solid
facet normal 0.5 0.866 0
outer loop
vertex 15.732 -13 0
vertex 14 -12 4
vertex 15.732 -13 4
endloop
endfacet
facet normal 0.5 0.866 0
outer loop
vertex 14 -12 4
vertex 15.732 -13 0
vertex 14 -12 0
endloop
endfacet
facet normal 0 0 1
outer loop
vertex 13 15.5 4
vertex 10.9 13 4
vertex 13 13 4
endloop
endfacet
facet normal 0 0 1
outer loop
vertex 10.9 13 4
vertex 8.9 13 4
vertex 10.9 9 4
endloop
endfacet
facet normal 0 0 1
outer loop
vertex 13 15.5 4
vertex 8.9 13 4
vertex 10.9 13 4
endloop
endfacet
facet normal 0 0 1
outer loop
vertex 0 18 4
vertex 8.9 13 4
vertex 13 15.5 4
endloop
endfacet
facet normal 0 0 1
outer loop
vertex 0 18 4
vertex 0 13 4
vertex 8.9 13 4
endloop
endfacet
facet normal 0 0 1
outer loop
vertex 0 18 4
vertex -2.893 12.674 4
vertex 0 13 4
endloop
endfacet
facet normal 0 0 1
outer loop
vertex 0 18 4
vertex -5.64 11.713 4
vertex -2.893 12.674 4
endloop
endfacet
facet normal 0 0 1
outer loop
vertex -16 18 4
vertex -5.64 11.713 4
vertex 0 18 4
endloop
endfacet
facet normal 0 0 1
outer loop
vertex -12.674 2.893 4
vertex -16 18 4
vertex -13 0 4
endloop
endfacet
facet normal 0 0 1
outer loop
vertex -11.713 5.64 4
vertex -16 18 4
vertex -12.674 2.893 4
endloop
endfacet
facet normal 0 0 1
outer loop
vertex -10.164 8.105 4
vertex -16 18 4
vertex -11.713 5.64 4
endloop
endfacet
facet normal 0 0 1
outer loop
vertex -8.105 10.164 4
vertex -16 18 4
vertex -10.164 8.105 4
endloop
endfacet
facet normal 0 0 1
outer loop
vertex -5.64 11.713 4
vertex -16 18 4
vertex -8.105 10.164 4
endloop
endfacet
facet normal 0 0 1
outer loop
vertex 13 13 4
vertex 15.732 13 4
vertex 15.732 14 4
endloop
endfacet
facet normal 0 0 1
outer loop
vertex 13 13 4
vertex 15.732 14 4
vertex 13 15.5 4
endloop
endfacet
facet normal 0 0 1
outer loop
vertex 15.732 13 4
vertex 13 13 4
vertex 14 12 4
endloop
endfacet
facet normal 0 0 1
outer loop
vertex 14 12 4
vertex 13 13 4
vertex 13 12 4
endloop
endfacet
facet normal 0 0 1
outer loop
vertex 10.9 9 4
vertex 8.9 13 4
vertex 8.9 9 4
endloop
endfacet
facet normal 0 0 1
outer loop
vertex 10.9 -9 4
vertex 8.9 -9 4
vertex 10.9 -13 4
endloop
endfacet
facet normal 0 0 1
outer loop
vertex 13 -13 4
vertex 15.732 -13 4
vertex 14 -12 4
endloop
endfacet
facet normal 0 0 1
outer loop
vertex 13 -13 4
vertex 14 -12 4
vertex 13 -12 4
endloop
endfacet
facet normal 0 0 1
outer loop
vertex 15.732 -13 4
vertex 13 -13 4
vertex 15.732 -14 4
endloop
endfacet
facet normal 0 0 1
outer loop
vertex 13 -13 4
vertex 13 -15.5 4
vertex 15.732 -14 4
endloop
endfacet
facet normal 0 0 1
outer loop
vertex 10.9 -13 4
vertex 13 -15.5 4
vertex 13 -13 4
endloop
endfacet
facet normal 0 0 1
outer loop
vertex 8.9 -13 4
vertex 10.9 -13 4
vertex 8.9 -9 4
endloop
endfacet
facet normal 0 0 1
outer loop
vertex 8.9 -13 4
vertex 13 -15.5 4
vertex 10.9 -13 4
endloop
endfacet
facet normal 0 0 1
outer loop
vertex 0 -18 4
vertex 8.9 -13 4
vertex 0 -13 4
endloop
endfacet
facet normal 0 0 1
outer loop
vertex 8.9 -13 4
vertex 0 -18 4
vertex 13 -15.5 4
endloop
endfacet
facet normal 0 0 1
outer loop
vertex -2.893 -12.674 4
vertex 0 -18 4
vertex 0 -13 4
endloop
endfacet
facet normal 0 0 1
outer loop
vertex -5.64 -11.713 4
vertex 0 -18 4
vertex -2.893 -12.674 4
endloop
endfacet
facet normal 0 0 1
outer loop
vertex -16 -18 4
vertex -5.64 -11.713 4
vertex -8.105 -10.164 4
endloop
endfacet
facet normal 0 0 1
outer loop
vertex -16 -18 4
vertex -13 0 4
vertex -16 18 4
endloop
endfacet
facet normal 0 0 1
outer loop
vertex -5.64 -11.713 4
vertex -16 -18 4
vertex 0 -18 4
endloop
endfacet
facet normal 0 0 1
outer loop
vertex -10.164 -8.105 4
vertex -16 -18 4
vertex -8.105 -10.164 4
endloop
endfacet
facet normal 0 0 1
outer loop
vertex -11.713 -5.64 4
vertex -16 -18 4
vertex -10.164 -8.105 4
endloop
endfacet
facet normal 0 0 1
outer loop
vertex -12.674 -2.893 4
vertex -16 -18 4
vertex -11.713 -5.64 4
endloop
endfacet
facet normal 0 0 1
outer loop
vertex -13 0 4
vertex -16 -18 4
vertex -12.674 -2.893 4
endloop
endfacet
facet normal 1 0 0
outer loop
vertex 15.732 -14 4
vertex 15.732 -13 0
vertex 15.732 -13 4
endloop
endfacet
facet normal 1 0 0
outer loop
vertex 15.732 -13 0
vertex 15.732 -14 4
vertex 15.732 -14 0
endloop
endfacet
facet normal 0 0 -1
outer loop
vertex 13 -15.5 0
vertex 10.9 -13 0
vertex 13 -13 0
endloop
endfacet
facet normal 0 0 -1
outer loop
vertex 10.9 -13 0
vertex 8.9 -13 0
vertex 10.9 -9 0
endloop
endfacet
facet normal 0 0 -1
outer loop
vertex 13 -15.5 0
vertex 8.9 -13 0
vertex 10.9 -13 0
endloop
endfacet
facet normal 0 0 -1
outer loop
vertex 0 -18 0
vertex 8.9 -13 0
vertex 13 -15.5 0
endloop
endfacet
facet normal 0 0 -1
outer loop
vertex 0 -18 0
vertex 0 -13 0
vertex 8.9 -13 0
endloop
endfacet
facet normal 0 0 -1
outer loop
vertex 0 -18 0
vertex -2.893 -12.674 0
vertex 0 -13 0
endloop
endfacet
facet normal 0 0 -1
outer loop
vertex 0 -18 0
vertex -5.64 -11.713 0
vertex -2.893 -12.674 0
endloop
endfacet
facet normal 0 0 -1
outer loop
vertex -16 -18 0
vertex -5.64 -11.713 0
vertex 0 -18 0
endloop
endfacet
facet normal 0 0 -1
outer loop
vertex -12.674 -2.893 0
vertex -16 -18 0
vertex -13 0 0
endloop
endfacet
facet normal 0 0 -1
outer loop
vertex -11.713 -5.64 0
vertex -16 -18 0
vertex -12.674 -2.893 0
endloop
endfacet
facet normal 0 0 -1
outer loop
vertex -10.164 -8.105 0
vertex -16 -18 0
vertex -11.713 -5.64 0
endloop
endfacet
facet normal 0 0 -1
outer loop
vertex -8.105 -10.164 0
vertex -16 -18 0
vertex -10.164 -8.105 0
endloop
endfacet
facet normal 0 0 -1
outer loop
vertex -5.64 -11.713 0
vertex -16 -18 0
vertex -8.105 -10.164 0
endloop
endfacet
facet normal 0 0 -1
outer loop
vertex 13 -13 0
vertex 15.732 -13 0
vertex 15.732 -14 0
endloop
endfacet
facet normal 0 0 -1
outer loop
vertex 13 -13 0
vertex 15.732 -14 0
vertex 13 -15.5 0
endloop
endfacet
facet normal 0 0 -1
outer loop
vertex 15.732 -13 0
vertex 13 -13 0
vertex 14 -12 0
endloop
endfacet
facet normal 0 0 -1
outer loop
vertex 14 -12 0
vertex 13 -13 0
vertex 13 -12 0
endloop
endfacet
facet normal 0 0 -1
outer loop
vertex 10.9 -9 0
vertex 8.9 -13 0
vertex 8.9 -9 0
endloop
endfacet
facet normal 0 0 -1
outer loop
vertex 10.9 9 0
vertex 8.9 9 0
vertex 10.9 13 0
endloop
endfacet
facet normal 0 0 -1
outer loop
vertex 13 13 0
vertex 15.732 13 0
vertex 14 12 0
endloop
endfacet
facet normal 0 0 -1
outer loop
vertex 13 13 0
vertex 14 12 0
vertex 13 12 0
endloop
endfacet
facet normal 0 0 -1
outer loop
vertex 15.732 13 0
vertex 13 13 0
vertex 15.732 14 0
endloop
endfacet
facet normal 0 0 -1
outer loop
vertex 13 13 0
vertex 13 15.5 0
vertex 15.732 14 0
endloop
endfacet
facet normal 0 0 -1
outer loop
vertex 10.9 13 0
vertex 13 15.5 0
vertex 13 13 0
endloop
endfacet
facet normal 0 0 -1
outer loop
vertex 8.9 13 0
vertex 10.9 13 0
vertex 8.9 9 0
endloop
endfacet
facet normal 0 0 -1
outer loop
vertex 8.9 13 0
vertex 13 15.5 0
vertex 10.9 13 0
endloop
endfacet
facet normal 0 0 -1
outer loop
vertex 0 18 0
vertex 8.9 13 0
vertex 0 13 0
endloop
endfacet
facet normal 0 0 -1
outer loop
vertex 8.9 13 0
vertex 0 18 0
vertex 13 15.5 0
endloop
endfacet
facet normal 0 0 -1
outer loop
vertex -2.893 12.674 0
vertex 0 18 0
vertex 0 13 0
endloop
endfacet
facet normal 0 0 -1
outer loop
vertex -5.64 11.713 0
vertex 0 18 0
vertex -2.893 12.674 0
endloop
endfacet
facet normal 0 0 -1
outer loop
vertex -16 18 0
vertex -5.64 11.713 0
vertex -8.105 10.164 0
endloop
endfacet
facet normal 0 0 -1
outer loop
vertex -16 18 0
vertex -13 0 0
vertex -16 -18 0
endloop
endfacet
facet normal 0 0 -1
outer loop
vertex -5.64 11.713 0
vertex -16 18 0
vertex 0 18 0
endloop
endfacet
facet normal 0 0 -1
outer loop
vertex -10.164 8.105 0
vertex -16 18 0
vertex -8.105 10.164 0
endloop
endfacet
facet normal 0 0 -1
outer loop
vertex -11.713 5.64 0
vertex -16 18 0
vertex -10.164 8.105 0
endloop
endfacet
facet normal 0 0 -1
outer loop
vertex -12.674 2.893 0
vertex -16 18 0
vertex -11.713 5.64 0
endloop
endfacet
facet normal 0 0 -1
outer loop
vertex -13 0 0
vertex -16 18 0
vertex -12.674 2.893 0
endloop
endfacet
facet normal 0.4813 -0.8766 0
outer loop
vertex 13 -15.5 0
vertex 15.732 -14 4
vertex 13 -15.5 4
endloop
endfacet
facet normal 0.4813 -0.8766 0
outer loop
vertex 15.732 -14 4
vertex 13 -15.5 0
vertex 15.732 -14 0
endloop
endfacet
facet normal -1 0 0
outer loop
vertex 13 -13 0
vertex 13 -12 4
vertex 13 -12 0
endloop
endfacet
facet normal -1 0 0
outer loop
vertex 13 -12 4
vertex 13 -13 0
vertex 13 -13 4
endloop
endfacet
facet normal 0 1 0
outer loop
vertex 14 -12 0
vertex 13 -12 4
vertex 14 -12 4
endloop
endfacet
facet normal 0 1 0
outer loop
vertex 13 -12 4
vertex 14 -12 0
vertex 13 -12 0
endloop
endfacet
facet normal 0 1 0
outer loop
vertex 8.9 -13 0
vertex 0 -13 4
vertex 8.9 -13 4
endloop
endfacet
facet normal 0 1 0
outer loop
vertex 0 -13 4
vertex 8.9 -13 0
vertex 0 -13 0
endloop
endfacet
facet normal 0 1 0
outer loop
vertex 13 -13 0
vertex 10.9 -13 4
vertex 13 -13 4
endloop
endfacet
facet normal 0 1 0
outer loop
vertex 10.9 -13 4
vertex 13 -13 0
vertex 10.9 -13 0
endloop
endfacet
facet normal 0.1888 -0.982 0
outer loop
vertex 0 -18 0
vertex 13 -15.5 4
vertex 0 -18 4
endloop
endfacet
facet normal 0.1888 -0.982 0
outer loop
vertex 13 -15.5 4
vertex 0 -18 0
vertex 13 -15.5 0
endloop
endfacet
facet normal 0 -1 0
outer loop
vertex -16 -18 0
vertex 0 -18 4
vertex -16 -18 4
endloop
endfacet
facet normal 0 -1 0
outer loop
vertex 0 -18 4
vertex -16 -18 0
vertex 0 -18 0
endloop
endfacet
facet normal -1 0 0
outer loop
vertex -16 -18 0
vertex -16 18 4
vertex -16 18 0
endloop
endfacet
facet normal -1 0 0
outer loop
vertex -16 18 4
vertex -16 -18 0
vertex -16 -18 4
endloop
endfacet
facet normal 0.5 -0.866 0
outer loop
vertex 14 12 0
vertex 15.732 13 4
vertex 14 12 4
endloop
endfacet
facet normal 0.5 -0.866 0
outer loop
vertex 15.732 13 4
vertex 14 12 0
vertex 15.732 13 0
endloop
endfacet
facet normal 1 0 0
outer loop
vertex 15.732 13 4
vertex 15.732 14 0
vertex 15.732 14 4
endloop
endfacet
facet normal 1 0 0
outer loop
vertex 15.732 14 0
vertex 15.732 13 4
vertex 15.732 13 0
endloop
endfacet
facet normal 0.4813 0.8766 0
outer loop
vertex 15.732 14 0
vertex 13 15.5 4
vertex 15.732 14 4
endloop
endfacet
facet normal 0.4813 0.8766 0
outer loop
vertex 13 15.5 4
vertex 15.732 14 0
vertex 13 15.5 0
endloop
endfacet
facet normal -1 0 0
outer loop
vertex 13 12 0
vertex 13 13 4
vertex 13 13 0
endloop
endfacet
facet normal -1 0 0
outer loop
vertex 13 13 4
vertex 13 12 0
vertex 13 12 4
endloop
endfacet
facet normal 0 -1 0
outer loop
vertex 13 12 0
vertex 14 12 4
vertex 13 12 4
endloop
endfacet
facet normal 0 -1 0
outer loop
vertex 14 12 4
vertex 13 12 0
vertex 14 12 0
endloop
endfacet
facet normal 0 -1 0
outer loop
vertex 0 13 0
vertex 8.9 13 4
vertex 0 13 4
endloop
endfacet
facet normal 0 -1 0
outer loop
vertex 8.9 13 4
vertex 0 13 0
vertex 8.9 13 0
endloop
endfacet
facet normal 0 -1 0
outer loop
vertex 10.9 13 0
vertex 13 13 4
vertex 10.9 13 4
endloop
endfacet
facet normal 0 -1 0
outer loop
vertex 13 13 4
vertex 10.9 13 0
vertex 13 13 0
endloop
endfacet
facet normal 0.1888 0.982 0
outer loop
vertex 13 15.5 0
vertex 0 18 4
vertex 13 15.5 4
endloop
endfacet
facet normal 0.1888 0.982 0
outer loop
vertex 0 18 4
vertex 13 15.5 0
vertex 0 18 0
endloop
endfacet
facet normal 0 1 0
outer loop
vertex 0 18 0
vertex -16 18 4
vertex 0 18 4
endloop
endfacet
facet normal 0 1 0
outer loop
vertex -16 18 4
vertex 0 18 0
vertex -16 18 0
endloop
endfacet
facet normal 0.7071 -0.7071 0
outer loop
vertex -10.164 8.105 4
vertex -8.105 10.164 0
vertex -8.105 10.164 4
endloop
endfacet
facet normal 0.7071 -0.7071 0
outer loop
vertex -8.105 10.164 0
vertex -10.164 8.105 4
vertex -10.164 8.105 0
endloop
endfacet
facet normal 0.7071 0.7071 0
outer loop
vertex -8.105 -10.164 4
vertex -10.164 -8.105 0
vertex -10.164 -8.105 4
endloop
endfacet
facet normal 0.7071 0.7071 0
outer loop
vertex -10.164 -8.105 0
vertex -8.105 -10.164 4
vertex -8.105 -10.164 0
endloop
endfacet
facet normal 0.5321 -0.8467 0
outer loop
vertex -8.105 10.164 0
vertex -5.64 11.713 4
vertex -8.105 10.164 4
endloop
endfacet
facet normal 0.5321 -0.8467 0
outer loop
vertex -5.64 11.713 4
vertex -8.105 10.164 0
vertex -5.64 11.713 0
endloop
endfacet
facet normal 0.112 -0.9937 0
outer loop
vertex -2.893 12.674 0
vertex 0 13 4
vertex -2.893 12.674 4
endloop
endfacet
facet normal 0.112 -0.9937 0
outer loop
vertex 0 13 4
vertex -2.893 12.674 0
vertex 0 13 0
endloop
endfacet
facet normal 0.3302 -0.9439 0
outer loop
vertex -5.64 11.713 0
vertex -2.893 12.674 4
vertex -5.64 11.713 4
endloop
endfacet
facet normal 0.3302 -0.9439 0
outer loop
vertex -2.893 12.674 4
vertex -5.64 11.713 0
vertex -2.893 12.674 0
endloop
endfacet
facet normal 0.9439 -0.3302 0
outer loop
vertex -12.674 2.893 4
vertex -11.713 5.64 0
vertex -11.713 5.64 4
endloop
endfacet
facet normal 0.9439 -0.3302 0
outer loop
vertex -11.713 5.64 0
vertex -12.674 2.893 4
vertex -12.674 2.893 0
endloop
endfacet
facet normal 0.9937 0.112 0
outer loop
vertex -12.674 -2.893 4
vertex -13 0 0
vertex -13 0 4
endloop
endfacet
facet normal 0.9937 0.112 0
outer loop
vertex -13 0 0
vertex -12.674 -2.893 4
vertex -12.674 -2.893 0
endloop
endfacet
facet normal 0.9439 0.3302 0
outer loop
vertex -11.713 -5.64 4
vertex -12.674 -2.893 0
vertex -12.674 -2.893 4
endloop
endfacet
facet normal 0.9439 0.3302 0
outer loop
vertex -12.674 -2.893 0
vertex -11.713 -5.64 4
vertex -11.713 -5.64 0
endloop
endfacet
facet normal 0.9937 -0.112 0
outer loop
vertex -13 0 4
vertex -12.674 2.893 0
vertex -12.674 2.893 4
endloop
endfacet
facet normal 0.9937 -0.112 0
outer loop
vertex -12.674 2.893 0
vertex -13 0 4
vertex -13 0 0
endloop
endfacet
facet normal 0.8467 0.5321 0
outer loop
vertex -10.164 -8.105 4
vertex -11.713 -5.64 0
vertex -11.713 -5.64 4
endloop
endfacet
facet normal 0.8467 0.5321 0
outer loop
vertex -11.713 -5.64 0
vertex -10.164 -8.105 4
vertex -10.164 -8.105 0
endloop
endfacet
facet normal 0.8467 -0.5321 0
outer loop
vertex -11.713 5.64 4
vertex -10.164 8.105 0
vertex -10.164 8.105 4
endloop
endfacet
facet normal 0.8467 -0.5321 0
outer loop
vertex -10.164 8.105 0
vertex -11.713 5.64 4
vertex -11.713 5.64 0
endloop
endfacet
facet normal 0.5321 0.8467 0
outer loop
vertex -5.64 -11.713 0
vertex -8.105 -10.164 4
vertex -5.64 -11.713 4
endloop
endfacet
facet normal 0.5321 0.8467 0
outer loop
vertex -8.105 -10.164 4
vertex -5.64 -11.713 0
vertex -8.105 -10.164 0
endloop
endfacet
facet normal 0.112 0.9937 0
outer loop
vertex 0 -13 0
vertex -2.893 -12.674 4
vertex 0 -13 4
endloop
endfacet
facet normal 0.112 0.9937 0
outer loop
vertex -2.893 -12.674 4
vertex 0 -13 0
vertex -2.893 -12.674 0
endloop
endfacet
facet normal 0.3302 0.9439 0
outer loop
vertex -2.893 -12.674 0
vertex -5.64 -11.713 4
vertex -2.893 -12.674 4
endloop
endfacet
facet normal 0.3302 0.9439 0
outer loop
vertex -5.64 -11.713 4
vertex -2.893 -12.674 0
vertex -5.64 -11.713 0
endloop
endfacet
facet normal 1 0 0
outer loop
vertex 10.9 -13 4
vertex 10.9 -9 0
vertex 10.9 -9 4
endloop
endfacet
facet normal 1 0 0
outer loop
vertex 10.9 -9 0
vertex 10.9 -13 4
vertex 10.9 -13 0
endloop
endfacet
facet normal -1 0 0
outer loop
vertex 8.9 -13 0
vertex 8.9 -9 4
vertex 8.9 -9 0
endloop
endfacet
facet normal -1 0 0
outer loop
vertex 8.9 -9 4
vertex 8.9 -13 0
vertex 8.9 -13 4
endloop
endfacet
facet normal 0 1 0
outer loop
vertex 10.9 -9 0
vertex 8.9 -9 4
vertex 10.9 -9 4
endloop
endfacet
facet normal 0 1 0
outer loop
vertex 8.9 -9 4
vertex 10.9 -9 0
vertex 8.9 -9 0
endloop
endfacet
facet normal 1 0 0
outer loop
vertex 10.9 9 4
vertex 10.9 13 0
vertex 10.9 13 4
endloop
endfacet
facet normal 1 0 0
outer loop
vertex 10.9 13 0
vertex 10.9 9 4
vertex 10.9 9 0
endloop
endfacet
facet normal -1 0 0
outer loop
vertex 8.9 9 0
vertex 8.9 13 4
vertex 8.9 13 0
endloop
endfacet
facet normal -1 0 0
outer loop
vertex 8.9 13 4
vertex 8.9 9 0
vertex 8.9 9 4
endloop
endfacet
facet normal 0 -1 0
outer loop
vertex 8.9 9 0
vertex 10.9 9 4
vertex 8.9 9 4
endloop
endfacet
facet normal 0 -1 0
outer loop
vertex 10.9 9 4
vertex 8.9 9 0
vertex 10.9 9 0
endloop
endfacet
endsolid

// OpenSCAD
// file: mirror_copy.scad
module mirror_copy(vector=[1,0,0]){
    children();
    mirror(vector) children();
}
// file: snapLib/SnapLib.0.36.scad
/*simple Snap library based on "Snap-Fit Joints for Plastics - A Design Guid" by Bayer MaterialScience LLC 
  http://fab.cba.mit.edu/classes/S62.12/people/vernelle.noel/Plastic_Snap_fit_design.pdf
 
 on http://www.thingiverse.com/thing:1860118
 
    by fpetrac Fausto Petraccone fpetrac@gmail.com 
    Licensed under the Creative Commons - Attribution - Non-Commercial license.
*/

/*Rev
    SnapLib 0.36.scad: added SnapHoleY function  
    SnapLib 0.35.scad: on RSnapY added a check to avioid interference of lobes during closure; on RRSnappY added a check to avioid overlapped lobes.
    SnapLib 0.30.scad  added function Hsnap and Snap to calculate the snap H or Y for cantilever snap
    SnapLib 0.25.scad  added Scale factor f to reduce the calculate value h or y (this mantain the snap on unbreakable zone when f>1)
    Snaprofile = 12; // [1:MXL, 2:40DP, 3:XL, 4:H, 5:T2.5, 6:T5, 7:T10, 8:AT5, 9:HTD_3mm, 10:HTD_5mm, 11:HTD_8mm, 12:GT2_2mm, 13:GT2_3mm, 14:GT2_5mm]
pLib 0.20.scad  Bug Fix
    SnapLib 0.10.scad  added RSnapY RRSnapY
    SnapLib 0.00.scad  first release
*///Example: 
//SnapY(la=10,root=5,uCut=1,l=30,w=4,help=true);

la=10;  //arm length(x)
root=3; //arm thickness at root
uCut=1;l=30;
w=4;    //arm width
f=1;    //factor
help=false; //help message

h=root;


/*
eps=0.5*6/100;//Elongation at break of PLA=6%
eps=0.5*12/100;//Elongation at break of ABS=12%
eps=0.5*18/100;//Elongation at break of PETG=18%
*/


profile = 1; // [1:SnapY, 2:SnapH, 3:SnapHoleY, 4:RSanapY, 5:RRSnapY]
if ( profile == 1 ) {SnapY(la=10,root=3,uCut=1,l=30,w=4,f=1,help=false ); }
if ( profile == 2 ) {SnapH(l,root,uCut,w,f=1,help); }
if ( profile == 3 ) {SnapHoleY(l=10,h=3,uCut=1,a=30,b=3,f=1,Pr=2); }
if ( profile == 4 ) {RSnapY(l,h,a,Lobi,r2,f=1,K2=2); }
if ( profile == 5 ) {RRSnapY(l,h,a,Lobi,r2,f=1,K1=2); }

eps=0.5*6/100;//Elongation at break of PLA=6%

//******************* functions **************************
function arm(l=10,w=4)=[[0,0],[l,0],[l,-w/2],[0,-w]];
function hook(width=4,uCut=1,xLand=1,angle=30,yLand=1)=[[0,0],[0,uCut],[xLand,uCut],[xLand+uCut/tan(angle),0],[xLand+uCut/tan(angle),-yLand],[0,-width]];
function Hsnap(l,y,f)= (1.09/f)*(eps*pow(la,2))/(y);
function Ysnap(l,h,f)= (1.09/f)*(eps*pow(la,2))/(h);

//SnapH(l=length,y,a=angle,b=width,f=1) Define y calculate h and divide the calculte h value to a factor f

//********************************************************
module SnapH(la,uCut,root,w,f=1)   
{
    h=Hsnap(l,y,f); //(length,depth,factor)
    p=y;
    
linear_extrude(height = b, center = f, convexity = 10, twist = 0)
polygon([[0,0],[l,0],[l,y],[l+p,y],[l+p+(y+h/4)/tan(a),-h/4],[l,-h/2],[0,-h]]);
}

//SnapY(la,root,uCut,l,w,f,help) 
//Define root calculate y and divide the calculated y value by a factor f

//********************************************************
module SnapY(la=10,root=3,uCut=1,l=30,w=4,f=1,help=false){
    helpText="Usage:\nmodule SnapY(la,root,uCut,l,w,f,help=false)\n
    la=length of clip from root of arm to hook(x)\n
    root=width of arm at root,\n
    uCut=depth of undercut(hook protrusion)\n
    l=overall length of clip(x)\n
    w=width of arm(z)\n
    f=factor)";
    if(help)echo(helpText);
    y=min(Ysnap(la,root,f),uCut);
     translate([la,0,0])linear_extrude(w)polygon(hook(root/2,uCut,1,l,1));
    linear_extrude(w)polygon(arm(la,root));
}

//********************************************************
//SnapHoleY(l,h,a,b,f=1,Pr=2) Define h calculate y and divide the calculte y value to a factor f the total hole depth is h*PR
module SnapHoleY(l=10,h=3,uCut=1,a=30,b=3,f=1,Pr=2){
        //%SnapY(l,h,a,b);  
        y=min(Ysnap(l,h,f),uCut); 
        YY=Pr*h;//depth Y;
        XX=1.1*(y+(y+h/4)/tan(a)); //Altezza totale +10%
        ZZ=0+b; //largezza piu tolleranza
        union(){
            translate([0,-YY,(b-ZZ)/2])cube([l,YY,ZZ],center=false); //gambo
            translate([l,-YY,(b-ZZ)/2])cube([XX,YY+y,ZZ],center=false);//testa
        }    
 }


//Define h calculate y and divide the calculated value to f
 
//********************************************************
module RSnapY(l,h,a,Lobi,r2,f=1,K2=2)   
{
    Theta=180/Lobi;
    y=(1.64/f)*K2*(eps*pow(l,2))/(r2);
    p=y;
    if(((r2-h)>y)&&(h<r2)){ //(r2-h)>y should be (r2-h/2)>y and  h<r2 for scad problem
      for(f=[0:1:Lobi])
          rotate([0,0,Theta*2*f])
              rotate_extrude(angle = Theta, convexity = 2,$fn=200)
                  translate([r2,0,0])
                      mirror([1,-1,0])
                          polygon([[0,0],[l,0],[l,y],[l+p,y],[l+p+(y+h/4)/tan(a),-h/4],[l,-h/2],[0,-h]]);
    }
    else{
      echo ("<b>WARNING:</b>");
      echo("y should be < r2-h ");
      echo("h should be < r2 ");
    }
}
//Define h calculate y and divide the calculated value to f

//********************************************************
module RRSnapY(l,h,a,Lobi,r2,f=1,K1=2)
{
    Theta=180/Lobi;
    y=(1.64/f)*K1*(eps*pow(l,2))/(r2);
    p=y;
    echo("y is", y);
    echo("r1/r2",(r2-h)/r2);
    echo("Theta", Theta);
    echo("r2-y",(r2-y));
    if(y<r2){
      for(f=[0:1:Lobi])
          rotate([0,180,Theta*2*f])
              rotate_extrude(angle = Theta, convexity = 2,$fn=200)
                  translate([r2,0,0])
                      mirror([1,1,0])
                          polygon([[0,0],[l,0],[l,y],[l+p,y],[l+p+(y+h/4)/tan(a),-h/4],[l,-h/2],[0,-h]]);
  }
      else{
      echo ("<b>WARNING:</b>");
      echo("y should be < r2 ");
      }
}
// main file
use <snapLib/SnapLib.0.36.scad>
use<mirror_copy.scad>

pcbClip();



module pcbClip(width=26,height=26,r=13,t=1.6,root=5,w=4,la=10,uCut=2,help=false){
    helpText="pcbClip Usage:\nmodule pcbClip(width,height,r,t,root,w,la)\n
    width=internal width of clip(y),height=height of clip from base to hook(x)\n
    r=radius of internal fillet or hole, t= thickness of pcb\n
    root=thickness of clip at root(z)\n
    w=width of arm(y)
    la=length of arm from root to hook\n
    uCut=undercut or protrusion of hook(y)";
    if(help)echo(helpText);
    //**************** calculated variables **************** 
    bh=height-la; echo(bh); 
    difference(){
        union(){    //main body
            mirror_copy([0,1,0]){
                rotate([0,0,180])cube([bh,width/2+root,w]); //base
                translate([0,-width/2,0])
                SnapY(la=height/2,root=root,l=30,w=w);  //arm a=angle
            }
        }
        cylinder(h=3*w,r=r,$fn=28,center=true); //centre hole or fillet
    }
    mirror_copy([0,1,0])translate([0.5+la-t,-width/2,0])cube([2,2*uCut,w]);
}
